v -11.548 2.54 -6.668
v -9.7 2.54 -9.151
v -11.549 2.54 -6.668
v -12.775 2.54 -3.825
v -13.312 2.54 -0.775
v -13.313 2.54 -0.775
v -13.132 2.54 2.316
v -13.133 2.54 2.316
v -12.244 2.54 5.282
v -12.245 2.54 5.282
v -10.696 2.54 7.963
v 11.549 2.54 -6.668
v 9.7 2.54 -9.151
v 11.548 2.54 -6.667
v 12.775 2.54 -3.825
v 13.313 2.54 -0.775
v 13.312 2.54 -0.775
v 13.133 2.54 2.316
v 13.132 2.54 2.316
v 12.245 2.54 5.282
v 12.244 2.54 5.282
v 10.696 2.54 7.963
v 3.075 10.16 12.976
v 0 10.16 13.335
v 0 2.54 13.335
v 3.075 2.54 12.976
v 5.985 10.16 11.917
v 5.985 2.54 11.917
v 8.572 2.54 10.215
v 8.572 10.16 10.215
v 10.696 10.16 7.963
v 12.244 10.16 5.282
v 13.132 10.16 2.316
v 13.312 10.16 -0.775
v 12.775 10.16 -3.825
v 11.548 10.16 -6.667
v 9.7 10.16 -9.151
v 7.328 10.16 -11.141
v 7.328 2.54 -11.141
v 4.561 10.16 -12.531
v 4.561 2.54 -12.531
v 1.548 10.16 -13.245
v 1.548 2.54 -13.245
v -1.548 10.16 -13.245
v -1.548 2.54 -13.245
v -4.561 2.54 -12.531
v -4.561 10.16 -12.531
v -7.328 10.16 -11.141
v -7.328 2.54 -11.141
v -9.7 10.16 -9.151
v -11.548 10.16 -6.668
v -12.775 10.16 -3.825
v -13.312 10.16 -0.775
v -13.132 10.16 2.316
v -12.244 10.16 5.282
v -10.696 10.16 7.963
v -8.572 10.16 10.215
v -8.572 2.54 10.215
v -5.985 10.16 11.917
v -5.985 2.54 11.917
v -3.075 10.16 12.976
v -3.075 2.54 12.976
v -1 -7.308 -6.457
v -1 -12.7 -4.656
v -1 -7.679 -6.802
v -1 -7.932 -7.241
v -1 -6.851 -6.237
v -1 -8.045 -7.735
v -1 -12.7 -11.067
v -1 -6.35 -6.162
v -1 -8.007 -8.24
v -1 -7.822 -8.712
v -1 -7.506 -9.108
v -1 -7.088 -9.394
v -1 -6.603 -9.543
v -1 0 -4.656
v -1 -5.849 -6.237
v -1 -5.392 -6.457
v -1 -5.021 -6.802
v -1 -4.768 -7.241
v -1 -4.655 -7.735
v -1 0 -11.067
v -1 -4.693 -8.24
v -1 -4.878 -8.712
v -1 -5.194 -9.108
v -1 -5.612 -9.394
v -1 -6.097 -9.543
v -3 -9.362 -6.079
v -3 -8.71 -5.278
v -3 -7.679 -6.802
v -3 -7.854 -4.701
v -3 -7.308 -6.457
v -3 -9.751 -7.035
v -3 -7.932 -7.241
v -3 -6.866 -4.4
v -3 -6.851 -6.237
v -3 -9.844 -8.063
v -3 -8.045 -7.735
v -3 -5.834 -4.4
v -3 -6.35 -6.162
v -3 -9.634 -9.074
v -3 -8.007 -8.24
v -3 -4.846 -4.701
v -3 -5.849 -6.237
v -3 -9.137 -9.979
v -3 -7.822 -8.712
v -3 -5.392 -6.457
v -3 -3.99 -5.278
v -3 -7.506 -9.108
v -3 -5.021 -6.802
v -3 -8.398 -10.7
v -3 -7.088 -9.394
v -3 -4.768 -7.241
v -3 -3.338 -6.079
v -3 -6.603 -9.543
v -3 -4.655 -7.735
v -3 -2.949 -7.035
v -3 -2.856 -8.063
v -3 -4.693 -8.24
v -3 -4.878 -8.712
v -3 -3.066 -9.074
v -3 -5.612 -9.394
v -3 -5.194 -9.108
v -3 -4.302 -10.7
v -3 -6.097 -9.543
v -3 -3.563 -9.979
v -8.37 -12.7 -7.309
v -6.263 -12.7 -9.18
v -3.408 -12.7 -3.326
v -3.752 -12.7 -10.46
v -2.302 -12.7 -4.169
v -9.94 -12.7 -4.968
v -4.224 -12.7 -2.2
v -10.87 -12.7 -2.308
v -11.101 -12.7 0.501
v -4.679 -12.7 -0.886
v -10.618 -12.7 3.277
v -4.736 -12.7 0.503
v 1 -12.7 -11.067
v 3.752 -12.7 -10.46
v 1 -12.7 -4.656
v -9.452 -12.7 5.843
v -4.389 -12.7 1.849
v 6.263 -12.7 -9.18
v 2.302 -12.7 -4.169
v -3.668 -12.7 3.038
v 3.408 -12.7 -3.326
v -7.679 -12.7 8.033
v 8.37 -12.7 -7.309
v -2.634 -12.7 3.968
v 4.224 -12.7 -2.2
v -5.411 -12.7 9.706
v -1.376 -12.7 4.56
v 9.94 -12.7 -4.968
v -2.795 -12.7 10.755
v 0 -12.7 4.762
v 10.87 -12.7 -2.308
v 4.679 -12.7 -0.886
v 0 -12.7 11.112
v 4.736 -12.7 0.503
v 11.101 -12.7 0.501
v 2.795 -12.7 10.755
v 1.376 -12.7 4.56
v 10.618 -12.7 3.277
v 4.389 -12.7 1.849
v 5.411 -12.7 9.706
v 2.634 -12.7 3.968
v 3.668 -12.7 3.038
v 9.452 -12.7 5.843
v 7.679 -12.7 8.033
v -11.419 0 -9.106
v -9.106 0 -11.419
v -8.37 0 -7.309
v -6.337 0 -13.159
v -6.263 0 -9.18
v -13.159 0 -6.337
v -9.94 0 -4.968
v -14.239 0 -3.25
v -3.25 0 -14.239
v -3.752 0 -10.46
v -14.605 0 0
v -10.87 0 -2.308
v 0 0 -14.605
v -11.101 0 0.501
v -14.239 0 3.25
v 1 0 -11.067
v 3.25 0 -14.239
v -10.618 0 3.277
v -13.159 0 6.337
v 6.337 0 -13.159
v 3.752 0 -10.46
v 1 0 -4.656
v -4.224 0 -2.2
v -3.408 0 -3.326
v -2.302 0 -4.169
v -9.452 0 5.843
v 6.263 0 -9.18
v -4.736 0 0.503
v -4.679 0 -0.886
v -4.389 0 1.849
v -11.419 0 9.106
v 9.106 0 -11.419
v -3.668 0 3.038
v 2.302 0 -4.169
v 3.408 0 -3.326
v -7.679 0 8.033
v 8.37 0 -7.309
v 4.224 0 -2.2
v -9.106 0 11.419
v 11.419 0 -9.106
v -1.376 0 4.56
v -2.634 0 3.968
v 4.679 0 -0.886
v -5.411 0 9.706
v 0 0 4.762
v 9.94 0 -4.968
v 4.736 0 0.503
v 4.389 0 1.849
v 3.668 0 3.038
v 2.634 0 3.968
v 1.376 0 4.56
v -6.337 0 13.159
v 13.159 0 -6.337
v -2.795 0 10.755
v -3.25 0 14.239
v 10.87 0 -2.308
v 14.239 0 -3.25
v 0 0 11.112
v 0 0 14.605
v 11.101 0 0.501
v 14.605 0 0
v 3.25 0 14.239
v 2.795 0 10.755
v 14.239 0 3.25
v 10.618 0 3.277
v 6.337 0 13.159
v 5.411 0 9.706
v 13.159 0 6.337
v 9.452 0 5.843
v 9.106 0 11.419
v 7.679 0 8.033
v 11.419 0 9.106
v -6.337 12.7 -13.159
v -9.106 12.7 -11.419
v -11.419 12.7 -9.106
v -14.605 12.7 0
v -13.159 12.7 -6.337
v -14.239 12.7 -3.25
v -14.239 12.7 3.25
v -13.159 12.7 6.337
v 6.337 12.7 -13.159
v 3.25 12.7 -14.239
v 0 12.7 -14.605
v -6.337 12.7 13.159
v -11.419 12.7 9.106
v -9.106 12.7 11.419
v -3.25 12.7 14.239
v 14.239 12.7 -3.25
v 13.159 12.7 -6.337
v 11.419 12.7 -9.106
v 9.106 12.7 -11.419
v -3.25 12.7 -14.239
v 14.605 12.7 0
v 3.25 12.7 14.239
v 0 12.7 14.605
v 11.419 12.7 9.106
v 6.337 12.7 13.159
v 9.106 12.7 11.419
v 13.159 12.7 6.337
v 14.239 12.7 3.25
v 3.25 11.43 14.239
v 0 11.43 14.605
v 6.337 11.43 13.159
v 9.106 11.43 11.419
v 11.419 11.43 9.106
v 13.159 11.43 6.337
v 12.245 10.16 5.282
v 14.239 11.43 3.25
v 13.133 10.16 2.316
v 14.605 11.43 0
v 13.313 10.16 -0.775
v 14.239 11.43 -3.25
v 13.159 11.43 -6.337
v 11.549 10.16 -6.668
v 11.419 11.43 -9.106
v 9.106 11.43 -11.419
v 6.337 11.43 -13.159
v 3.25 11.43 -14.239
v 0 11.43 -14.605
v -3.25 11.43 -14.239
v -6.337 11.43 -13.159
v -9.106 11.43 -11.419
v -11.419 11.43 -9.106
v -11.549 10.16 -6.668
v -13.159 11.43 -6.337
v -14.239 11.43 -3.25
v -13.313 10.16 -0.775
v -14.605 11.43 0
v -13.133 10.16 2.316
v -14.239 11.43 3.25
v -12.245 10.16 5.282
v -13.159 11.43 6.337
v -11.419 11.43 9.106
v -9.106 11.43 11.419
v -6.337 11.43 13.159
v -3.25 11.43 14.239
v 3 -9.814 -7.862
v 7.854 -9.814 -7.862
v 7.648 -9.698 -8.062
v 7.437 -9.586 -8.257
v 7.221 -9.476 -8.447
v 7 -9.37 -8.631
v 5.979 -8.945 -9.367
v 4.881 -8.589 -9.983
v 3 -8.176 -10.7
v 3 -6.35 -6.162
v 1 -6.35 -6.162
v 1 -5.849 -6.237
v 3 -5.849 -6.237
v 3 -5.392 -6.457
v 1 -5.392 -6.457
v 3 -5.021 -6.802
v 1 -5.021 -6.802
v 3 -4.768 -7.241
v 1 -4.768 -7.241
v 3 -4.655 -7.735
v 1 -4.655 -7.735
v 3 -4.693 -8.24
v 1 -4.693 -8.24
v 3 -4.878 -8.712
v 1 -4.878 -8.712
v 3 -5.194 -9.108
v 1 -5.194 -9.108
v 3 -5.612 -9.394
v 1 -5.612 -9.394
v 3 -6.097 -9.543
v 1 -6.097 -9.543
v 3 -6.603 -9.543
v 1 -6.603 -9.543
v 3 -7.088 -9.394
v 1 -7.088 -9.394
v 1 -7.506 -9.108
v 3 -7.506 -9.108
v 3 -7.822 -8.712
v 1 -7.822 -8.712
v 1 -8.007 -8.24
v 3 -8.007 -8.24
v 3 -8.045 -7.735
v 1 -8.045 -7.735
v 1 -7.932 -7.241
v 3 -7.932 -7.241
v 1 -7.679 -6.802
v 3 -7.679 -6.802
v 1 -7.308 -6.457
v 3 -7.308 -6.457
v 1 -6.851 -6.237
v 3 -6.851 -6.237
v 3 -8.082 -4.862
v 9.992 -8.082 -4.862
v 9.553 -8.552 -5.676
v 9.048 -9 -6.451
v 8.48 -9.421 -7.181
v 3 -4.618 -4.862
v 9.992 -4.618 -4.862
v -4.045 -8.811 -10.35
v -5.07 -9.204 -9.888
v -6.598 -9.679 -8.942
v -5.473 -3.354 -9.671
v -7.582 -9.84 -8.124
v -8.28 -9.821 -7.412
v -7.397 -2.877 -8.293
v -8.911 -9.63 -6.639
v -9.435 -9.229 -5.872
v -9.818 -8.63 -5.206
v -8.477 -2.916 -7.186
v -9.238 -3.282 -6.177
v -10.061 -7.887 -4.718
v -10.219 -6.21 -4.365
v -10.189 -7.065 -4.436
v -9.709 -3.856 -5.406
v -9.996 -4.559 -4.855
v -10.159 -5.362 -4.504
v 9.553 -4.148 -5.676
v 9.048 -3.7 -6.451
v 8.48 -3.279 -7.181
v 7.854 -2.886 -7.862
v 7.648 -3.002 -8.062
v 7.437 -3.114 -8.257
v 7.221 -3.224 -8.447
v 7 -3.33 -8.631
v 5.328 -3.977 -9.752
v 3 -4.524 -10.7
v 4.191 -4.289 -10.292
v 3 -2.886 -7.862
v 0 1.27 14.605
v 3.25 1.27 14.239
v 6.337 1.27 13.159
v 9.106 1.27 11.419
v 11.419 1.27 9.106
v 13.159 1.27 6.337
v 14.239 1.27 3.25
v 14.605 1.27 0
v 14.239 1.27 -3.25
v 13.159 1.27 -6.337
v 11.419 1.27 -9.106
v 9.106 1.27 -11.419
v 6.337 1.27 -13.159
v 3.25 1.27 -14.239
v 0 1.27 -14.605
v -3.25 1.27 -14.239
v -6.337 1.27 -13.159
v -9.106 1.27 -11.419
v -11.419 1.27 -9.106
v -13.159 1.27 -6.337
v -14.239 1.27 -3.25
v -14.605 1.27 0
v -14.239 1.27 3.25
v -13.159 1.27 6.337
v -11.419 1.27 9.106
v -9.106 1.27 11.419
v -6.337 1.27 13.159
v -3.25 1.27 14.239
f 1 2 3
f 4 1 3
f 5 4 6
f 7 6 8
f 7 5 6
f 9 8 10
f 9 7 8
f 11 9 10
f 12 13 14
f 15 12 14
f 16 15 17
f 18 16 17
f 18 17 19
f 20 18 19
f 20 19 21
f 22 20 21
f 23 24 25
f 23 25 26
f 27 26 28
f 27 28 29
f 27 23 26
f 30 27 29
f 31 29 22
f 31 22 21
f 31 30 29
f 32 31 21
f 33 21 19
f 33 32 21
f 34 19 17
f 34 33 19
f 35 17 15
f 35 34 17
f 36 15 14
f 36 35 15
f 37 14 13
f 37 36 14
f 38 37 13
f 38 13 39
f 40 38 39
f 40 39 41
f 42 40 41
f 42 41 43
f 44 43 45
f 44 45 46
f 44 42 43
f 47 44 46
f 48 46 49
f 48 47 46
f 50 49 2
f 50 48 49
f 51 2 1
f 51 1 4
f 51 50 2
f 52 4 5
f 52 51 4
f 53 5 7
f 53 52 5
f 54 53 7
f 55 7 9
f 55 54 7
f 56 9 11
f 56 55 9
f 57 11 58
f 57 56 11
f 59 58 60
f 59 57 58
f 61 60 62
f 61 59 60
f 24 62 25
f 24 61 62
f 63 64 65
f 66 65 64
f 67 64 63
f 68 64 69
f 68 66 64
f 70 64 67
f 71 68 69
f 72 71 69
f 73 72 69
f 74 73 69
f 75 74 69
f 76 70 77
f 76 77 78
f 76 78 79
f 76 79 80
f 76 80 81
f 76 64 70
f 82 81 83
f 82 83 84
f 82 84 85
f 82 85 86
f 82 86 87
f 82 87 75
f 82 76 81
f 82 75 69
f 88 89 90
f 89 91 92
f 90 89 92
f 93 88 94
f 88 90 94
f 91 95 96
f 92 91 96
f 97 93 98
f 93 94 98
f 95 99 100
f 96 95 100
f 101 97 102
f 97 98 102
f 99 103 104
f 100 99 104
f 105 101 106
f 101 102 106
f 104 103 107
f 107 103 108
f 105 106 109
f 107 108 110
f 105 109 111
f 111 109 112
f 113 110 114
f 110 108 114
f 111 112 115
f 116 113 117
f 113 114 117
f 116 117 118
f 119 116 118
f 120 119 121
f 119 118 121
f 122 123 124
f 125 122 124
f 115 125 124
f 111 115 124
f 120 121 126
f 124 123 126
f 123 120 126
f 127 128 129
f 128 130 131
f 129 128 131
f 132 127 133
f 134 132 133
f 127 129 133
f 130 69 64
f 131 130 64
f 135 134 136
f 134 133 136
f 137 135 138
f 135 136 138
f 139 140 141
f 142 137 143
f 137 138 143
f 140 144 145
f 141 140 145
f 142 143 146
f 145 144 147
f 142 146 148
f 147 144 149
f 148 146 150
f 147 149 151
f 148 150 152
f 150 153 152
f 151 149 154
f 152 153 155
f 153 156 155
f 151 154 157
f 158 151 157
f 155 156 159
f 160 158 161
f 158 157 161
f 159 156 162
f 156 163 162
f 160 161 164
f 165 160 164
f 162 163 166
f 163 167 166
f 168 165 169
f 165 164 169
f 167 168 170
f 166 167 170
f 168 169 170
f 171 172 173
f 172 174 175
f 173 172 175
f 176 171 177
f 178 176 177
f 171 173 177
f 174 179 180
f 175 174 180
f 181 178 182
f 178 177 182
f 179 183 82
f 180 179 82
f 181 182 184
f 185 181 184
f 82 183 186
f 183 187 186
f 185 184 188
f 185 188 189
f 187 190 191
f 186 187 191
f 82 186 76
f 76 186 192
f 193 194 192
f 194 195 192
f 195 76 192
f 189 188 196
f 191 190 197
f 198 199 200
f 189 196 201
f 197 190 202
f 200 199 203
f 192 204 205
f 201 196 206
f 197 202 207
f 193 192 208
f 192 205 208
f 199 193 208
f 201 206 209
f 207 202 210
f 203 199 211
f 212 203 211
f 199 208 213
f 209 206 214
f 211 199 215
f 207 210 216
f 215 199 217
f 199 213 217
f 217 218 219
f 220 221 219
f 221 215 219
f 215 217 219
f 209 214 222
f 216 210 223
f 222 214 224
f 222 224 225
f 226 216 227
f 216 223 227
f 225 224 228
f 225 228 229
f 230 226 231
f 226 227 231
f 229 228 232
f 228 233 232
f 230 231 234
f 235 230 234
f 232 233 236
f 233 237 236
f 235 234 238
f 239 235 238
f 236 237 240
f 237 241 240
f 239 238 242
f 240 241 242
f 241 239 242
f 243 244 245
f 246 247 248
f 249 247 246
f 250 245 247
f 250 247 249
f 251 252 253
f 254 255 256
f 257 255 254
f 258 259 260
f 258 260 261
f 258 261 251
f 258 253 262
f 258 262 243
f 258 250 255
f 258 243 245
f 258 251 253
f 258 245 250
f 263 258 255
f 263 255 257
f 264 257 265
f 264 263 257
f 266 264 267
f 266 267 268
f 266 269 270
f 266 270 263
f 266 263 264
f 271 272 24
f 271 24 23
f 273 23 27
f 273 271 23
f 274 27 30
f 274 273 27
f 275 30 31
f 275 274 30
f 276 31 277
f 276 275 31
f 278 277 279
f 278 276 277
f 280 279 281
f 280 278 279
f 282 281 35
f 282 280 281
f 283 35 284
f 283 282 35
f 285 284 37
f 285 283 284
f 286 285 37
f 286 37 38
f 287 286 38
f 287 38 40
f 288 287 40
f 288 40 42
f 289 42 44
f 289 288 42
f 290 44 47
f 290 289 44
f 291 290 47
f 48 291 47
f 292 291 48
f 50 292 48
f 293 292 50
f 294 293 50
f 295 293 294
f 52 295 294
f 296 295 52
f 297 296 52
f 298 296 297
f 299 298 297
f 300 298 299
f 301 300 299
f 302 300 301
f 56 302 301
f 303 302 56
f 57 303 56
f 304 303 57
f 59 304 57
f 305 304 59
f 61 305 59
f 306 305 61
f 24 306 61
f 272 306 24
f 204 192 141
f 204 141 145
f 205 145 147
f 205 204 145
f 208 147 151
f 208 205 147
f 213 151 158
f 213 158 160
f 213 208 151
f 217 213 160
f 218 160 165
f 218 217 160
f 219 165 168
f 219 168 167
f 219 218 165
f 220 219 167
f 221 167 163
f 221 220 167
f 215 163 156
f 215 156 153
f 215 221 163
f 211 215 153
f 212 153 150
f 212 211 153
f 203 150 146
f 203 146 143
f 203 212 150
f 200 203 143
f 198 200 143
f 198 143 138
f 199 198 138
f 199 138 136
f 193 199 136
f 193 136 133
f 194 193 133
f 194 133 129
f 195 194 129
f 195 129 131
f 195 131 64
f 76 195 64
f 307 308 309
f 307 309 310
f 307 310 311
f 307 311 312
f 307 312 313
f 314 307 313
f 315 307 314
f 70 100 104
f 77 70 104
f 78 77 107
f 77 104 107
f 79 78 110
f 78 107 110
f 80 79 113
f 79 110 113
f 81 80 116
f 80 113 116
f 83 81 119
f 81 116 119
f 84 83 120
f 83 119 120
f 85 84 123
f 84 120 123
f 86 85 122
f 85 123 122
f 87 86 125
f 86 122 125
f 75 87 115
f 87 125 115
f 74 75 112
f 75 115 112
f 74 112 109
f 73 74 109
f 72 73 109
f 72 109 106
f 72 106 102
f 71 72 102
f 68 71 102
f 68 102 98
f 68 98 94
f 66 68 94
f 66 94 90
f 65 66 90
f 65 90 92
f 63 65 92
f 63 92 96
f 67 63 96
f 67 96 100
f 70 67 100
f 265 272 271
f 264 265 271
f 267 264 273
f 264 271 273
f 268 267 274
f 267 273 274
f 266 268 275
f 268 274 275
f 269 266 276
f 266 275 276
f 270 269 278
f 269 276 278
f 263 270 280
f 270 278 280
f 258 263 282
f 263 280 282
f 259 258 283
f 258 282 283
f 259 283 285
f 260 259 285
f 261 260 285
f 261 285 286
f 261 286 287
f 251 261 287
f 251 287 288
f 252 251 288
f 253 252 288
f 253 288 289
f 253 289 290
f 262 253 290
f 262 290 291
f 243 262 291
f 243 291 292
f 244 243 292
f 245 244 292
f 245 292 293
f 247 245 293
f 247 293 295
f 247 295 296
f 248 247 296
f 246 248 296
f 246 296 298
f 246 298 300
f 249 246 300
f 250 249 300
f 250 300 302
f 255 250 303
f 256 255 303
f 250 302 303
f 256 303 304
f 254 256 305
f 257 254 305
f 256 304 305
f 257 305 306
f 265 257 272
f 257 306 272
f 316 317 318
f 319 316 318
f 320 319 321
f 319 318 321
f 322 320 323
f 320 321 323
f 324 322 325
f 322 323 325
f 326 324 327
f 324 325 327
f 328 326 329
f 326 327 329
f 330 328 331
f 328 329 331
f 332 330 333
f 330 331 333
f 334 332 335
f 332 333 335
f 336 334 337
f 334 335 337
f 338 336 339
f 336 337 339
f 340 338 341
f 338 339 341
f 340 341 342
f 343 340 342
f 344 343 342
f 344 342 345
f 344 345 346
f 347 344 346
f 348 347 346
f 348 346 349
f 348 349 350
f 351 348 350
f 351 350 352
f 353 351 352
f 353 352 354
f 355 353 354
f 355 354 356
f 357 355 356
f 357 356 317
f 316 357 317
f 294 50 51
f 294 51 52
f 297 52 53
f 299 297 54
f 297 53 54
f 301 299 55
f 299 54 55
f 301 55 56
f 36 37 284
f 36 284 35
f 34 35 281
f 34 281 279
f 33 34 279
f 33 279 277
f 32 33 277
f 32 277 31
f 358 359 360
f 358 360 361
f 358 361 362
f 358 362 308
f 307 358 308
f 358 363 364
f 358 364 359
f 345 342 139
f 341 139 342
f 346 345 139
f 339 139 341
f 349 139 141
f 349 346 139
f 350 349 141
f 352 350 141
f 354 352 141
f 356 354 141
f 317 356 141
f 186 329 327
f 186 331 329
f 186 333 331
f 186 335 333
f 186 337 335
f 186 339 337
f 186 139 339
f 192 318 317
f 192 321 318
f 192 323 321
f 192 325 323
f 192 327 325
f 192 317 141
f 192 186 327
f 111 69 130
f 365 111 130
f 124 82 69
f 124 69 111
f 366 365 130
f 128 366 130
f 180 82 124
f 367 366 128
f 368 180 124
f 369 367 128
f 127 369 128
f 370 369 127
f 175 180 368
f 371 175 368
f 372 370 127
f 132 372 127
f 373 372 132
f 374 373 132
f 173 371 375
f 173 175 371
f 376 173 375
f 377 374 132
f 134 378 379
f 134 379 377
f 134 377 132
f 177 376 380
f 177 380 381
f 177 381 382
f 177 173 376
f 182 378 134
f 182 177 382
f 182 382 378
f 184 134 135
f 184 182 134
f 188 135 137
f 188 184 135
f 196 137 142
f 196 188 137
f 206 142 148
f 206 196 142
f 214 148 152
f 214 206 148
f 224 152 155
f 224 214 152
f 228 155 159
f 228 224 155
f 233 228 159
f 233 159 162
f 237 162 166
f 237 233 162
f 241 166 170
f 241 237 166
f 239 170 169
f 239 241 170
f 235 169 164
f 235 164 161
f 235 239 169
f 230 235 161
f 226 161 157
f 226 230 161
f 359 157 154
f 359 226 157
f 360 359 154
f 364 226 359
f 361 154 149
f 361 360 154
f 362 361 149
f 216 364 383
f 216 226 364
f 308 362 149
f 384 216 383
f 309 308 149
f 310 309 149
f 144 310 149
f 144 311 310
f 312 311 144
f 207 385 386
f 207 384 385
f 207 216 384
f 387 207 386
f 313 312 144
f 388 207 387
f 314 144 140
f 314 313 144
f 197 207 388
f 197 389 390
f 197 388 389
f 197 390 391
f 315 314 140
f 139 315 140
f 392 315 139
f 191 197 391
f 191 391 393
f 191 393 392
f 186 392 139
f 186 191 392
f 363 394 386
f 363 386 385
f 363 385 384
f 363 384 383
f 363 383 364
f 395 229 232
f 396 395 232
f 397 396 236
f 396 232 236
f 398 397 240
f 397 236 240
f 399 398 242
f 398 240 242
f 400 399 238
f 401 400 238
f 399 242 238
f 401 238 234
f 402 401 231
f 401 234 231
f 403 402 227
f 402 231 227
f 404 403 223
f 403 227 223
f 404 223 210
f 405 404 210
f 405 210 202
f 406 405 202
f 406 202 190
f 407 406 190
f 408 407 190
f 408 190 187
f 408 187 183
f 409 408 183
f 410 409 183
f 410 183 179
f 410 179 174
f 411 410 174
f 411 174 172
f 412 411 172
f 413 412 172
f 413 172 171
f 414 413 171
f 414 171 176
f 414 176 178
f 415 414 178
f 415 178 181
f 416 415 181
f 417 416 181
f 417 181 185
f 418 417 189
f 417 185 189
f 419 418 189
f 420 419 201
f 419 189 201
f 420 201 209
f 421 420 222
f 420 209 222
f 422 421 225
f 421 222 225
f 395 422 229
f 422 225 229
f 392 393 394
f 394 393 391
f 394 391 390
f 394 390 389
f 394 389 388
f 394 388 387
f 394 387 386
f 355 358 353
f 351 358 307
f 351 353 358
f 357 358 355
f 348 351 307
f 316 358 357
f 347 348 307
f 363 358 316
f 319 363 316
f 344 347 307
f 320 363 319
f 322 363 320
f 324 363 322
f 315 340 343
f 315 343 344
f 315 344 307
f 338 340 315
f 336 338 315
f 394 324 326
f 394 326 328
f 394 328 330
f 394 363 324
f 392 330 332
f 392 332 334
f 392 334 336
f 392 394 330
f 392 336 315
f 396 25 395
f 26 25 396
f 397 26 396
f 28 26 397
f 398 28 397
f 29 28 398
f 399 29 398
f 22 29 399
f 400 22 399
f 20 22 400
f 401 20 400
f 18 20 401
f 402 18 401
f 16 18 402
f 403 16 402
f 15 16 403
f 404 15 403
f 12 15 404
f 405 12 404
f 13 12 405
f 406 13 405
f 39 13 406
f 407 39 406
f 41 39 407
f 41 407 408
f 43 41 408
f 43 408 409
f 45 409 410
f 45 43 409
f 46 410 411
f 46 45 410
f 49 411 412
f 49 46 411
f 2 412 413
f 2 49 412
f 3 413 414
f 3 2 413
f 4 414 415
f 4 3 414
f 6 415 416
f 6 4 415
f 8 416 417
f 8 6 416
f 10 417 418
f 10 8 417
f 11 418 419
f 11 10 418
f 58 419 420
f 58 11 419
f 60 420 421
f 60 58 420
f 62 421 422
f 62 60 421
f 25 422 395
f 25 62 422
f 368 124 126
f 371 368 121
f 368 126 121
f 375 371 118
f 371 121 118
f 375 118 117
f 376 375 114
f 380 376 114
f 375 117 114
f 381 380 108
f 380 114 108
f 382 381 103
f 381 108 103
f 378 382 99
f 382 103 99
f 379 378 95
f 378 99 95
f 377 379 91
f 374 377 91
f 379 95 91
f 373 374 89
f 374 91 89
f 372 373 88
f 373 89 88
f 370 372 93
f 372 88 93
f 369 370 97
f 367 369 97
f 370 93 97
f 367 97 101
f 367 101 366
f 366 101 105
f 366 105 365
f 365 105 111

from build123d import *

# Parameters (mm, degrees)
SKETCH1_R                           = 11.1125
BOSS_EXTRUDE1_DEPTH                 = 12.7
CUT_EXTRUDE1_START                  = -12.7
SKETCH2_R                           = 4
CUT_EXTRUDE1_DEPTH                  = 12.7
CUT_EXTRUDE2_START                  = -12.7
SKETCH3_R                           = 4.7625
CUT_EXTRUDE2_DEPTH                  = 12.7
CUT_EXTRUDE3_REACH                  = 31.869
CUT_EXTRUDE4_DEPTH                  = 4
CUT_EXTRUDE4_DIRECTION_2_REACH      = 26.756
CUT_EXTRUDE4_DIRECTION_2_END_RADIUS = 11.1125
M3_CLEARANCE_HOLE1_D                = 3.4
CUT_EXTRUDE5_REACH                  = 23.999
SKETCH9_R                           = 3.5
SKETCH10_R                          = 14.605
BOSS_EXTRUDE2_DEPTH                 = 12.7
CUT_EXTRUDE6_START                  = -2.54
SKETCH11_R                          = 14.605
SKETCH11_R_2                        = 13.335
CUT_EXTRUDE6_DEPTH                  = 7.62
CHAMFER1_SIZE                       = 1.27


# Read off the part's stored shape, not the designer's step: Split1
with BuildPart() as part:
    # Sketch1 → Boss-Extrude1 (new, symmetric)
    with BuildSketch(Plane(origin=(0, 0, 0), x_dir=(1, 0, 0), z_dir=(0, 1, 0))):
        with Locations(Location((0, 0, 0), (0, 0, 270))):
            Circle(SKETCH1_R)
    extrude(amount=BOSS_EXTRUDE1_DEPTH, both=True)

    # Sketch2 → Cut-Extrude1 (cut)
    with BuildSketch(Plane(origin=(0, 12.7, 0), x_dir=(1, 0, 0), z_dir=(0, 1, 0)).offset(CUT_EXTRUDE1_START)):
        with Locations(Location((0, 0, 0), (0, 0, 270))):
            Circle(SKETCH2_R)
    extrude(amount=CUT_EXTRUDE1_DEPTH, mode=Mode.SUBTRACT)

    # Sketch3 → Cut-Extrude2 (cut)
    with BuildSketch(Plane.XZ.offset(12.7).offset(CUT_EXTRUDE2_START)):
        with Locations(Location((0, 0, 0), (0, 0, 270))):
            Circle(SKETCH3_R)
    extrude(amount=CUT_EXTRUDE2_DEPTH, mode=Mode.SUBTRACT)

    # Sketch4 → Cut-Extrude3 (cut, up to next)
    with BuildSketch(Plane(origin=(0, 12.7, 0), x_dir=(1, 0, 0), z_dir=(0, 1, 0)), mode=Mode.PRIVATE) as cut_extrude3_sk1:
        with BuildLine():
            Line((-1, 3.872983346), (-1, 11.067414163))
            ThreePointArc((-1, 11.067414163), (0, 11.1125), (1, 11.067414163))
            Line((1, 11.067414163), (1, 3.872983346))
            ThreePointArc((1, 3.872983346), (0, 4), (-1, 3.872983346))
        make_face()
    cut_extrude3_tool1 = extrude(cut_extrude3_sk1.sketch, amount=-CUT_EXTRUDE3_REACH, mode=Mode.PRIVATE) & part.part
    add(cut_extrude3_tool1.solids().sort_by_distance((0, 12.7, -7.527621))[0], mode=Mode.SUBTRACT)

    # Sketch5 → Cut-Extrude4 (cut)
    with BuildSketch(Plane(origin=(7, 0, 0), x_dir=(0, 0, -1), z_dir=(1, 0, 0))):
        Polygon((7.86187193, 2.885898385), (10.86187193, 4.617949192), (10.86187193, 8.082050808), (7.86187193, 9.814101615), (4.86187193, 8.082050808), (4.86187193, 4.617949192), align=None)
        Polygon((7.86187193, -9.814101615), (10.86187193, -8.082050808), (10.86187193, -4.617949192), (7.86187193, -2.885898385), (4.86187193, -4.617949192), (4.86187193, -8.082050808), align=None)
    extrude(amount=-CUT_EXTRUDE4_DEPTH, mode=Mode.SUBTRACT)

    # Cut-Extrude4 direction 2: up to this cylinder (the profile starts inside it)
    cut_extrude4_direction_2_end = Plane(origin=(0, 0, 0), z_dir=(0, -1, 0)) * Cylinder(CUT_EXTRUDE4_DIRECTION_2_END_RADIUS, 89.437, mode=Mode.PRIVATE)
    # Sketch5 → Cut-Extrude4 direction 2 (cut, up to the surface)
    with BuildSketch(Plane(origin=(7, 0, 0), x_dir=(0, 0, -1), z_dir=(1, 0, 0)), mode=Mode.PRIVATE) as cut_extrude4_direction_2_sk1:
        Polygon((7.86187193, 2.885898385), (10.86187193, 4.617949192), (10.86187193, 8.082050808), (7.86187193, 9.814101615), (4.86187193, 8.082050808), (4.86187193, 4.617949192), align=None)
    cut_extrude4_direction_2_tool1 = extrude(cut_extrude4_direction_2_sk1.sketch, amount=CUT_EXTRUDE4_DIRECTION_2_REACH, mode=Mode.PRIVATE) & cut_extrude4_direction_2_end
    add(cut_extrude4_direction_2_tool1.solids().sort_by_distance((7, 6.35, -7.861872))[0], mode=Mode.SUBTRACT)
    # Sketch5 → Cut-Extrude4 direction 2 (cut, up to the surface)
    with BuildSketch(Plane(origin=(7, 0, 0), x_dir=(0, 0, -1), z_dir=(1, 0, 0)), mode=Mode.PRIVATE) as cut_extrude4_direction_2_sk2:
        Polygon((7.86187193, -9.814101615), (10.86187193, -8.082050808), (10.86187193, -4.617949192), (7.86187193, -2.885898385), (4.86187193, -4.617949192), (4.86187193, -8.082050808), align=None)
    cut_extrude4_direction_2_tool2 = extrude(cut_extrude4_direction_2_sk2.sketch, amount=CUT_EXTRUDE4_DIRECTION_2_REACH, mode=Mode.PRIVATE) & cut_extrude4_direction_2_end
    add(cut_extrude4_direction_2_tool2.solids().sort_by_distance((7, -6.35, -7.861872))[0], mode=Mode.SUBTRACT)

    # M3 Clearance Hole1 (through all)
    with Locations(Plane(origin=(3, 0, 0), x_dir=(0, 0, -1), z_dir=(1, 0, 0))):
        with Locations((7.86187193, 6.35), (7.86187193, -6.35)):
            Hole(M3_CLEARANCE_HOLE1_D / 2)

    # Sketch9 → Cut-Extrude5 (cut, up to next)
    with BuildSketch(Plane(origin=(-3, 0, 0), x_dir=(0, 0, -1), z_dir=(1, 0, 0)), mode=Mode.PRIVATE) as cut_extrude5_sk1:
        with Locations((7.86187193, 6.35)):
            Circle(SKETCH9_R)
    cut_extrude5_tool1 = extrude(cut_extrude5_sk1.sketch, amount=-CUT_EXTRUDE5_REACH, mode=Mode.PRIVATE) & part.part
    # Sketch9 → Cut-Extrude5 (cut, up to next)
    with BuildSketch(Plane(origin=(-3, 0, 0), x_dir=(0, 0, -1), z_dir=(1, 0, 0)), mode=Mode.PRIVATE) as cut_extrude5_sk2:
        with Locations((7.86187193, -6.35)):
            Circle(SKETCH9_R)
    cut_extrude5_tool2 = extrude(cut_extrude5_sk2.sketch, amount=-CUT_EXTRUDE5_REACH, mode=Mode.PRIVATE) & part.part
    add(cut_extrude5_tool1.solids().sort_by_distance((-3, 6.35, -7.861872))[0], mode=Mode.SUBTRACT)
    add(cut_extrude5_tool2.solids().sort_by_distance((-3, -6.35, -7.861872))[0], mode=Mode.SUBTRACT)


with BuildPart() as body_2:
    # Split1: the piece on the far side of the plane
    add(part.part)
    split(bisect_by=Plane(origin=(0, 0, 0), x_dir=(1, 0, 0), z_dir=(0, 1, 0)), keep=Keep.BOTTOM)

    # Sketch10 → Boss-Extrude2 (add)
    with BuildSketch(Plane(origin=(0, 0, 0), x_dir=(1, 0, 0), z_dir=(0, 1, 0))):
        with Locations(Location((0, 0, 0), (0, 0, 270))):
            Circle(SKETCH10_R)
    extrude(amount=BOSS_EXTRUDE2_DEPTH)

    # Sketch11 → Cut-Extrude6 (cut)
    with BuildSketch(Plane(origin=(0, 12.7, 0), x_dir=(1, 0, 0), z_dir=(0, 1, 0)).offset(CUT_EXTRUDE6_START)):
        with Locations(Location((0, 0, 0), (0, 0, 270))):
            Circle(SKETCH11_R)
        with Locations(Location((0, 0, 0), (0, 0, 270))):
            Circle(SKETCH11_R_2, mode=Mode.SUBTRACT)
    extrude(amount=-CUT_EXTRUDE6_DEPTH, mode=Mode.SUBTRACT)

    # Chamfer1
    chamfer1_edges = [body_2.edges().sort_by_distance(p)[0] for p in [
        (0, 10.16, -14.605),
        (0, 2.54, -14.605),
    ]]
    chamfer(chamfer1_edges, length=CHAMFER1_SIZE - 0.0001)  # a hair under: the kernel refuses the full size


with BuildPart() as part_1:
    add(part.part)

    # Split1
    split(bisect_by=Plane(origin=(0, 0, 0), x_dir=(1, 0, 0), z_dir=(0, 1, 0)), keep=Keep.TOP)


solid = body_2.part
